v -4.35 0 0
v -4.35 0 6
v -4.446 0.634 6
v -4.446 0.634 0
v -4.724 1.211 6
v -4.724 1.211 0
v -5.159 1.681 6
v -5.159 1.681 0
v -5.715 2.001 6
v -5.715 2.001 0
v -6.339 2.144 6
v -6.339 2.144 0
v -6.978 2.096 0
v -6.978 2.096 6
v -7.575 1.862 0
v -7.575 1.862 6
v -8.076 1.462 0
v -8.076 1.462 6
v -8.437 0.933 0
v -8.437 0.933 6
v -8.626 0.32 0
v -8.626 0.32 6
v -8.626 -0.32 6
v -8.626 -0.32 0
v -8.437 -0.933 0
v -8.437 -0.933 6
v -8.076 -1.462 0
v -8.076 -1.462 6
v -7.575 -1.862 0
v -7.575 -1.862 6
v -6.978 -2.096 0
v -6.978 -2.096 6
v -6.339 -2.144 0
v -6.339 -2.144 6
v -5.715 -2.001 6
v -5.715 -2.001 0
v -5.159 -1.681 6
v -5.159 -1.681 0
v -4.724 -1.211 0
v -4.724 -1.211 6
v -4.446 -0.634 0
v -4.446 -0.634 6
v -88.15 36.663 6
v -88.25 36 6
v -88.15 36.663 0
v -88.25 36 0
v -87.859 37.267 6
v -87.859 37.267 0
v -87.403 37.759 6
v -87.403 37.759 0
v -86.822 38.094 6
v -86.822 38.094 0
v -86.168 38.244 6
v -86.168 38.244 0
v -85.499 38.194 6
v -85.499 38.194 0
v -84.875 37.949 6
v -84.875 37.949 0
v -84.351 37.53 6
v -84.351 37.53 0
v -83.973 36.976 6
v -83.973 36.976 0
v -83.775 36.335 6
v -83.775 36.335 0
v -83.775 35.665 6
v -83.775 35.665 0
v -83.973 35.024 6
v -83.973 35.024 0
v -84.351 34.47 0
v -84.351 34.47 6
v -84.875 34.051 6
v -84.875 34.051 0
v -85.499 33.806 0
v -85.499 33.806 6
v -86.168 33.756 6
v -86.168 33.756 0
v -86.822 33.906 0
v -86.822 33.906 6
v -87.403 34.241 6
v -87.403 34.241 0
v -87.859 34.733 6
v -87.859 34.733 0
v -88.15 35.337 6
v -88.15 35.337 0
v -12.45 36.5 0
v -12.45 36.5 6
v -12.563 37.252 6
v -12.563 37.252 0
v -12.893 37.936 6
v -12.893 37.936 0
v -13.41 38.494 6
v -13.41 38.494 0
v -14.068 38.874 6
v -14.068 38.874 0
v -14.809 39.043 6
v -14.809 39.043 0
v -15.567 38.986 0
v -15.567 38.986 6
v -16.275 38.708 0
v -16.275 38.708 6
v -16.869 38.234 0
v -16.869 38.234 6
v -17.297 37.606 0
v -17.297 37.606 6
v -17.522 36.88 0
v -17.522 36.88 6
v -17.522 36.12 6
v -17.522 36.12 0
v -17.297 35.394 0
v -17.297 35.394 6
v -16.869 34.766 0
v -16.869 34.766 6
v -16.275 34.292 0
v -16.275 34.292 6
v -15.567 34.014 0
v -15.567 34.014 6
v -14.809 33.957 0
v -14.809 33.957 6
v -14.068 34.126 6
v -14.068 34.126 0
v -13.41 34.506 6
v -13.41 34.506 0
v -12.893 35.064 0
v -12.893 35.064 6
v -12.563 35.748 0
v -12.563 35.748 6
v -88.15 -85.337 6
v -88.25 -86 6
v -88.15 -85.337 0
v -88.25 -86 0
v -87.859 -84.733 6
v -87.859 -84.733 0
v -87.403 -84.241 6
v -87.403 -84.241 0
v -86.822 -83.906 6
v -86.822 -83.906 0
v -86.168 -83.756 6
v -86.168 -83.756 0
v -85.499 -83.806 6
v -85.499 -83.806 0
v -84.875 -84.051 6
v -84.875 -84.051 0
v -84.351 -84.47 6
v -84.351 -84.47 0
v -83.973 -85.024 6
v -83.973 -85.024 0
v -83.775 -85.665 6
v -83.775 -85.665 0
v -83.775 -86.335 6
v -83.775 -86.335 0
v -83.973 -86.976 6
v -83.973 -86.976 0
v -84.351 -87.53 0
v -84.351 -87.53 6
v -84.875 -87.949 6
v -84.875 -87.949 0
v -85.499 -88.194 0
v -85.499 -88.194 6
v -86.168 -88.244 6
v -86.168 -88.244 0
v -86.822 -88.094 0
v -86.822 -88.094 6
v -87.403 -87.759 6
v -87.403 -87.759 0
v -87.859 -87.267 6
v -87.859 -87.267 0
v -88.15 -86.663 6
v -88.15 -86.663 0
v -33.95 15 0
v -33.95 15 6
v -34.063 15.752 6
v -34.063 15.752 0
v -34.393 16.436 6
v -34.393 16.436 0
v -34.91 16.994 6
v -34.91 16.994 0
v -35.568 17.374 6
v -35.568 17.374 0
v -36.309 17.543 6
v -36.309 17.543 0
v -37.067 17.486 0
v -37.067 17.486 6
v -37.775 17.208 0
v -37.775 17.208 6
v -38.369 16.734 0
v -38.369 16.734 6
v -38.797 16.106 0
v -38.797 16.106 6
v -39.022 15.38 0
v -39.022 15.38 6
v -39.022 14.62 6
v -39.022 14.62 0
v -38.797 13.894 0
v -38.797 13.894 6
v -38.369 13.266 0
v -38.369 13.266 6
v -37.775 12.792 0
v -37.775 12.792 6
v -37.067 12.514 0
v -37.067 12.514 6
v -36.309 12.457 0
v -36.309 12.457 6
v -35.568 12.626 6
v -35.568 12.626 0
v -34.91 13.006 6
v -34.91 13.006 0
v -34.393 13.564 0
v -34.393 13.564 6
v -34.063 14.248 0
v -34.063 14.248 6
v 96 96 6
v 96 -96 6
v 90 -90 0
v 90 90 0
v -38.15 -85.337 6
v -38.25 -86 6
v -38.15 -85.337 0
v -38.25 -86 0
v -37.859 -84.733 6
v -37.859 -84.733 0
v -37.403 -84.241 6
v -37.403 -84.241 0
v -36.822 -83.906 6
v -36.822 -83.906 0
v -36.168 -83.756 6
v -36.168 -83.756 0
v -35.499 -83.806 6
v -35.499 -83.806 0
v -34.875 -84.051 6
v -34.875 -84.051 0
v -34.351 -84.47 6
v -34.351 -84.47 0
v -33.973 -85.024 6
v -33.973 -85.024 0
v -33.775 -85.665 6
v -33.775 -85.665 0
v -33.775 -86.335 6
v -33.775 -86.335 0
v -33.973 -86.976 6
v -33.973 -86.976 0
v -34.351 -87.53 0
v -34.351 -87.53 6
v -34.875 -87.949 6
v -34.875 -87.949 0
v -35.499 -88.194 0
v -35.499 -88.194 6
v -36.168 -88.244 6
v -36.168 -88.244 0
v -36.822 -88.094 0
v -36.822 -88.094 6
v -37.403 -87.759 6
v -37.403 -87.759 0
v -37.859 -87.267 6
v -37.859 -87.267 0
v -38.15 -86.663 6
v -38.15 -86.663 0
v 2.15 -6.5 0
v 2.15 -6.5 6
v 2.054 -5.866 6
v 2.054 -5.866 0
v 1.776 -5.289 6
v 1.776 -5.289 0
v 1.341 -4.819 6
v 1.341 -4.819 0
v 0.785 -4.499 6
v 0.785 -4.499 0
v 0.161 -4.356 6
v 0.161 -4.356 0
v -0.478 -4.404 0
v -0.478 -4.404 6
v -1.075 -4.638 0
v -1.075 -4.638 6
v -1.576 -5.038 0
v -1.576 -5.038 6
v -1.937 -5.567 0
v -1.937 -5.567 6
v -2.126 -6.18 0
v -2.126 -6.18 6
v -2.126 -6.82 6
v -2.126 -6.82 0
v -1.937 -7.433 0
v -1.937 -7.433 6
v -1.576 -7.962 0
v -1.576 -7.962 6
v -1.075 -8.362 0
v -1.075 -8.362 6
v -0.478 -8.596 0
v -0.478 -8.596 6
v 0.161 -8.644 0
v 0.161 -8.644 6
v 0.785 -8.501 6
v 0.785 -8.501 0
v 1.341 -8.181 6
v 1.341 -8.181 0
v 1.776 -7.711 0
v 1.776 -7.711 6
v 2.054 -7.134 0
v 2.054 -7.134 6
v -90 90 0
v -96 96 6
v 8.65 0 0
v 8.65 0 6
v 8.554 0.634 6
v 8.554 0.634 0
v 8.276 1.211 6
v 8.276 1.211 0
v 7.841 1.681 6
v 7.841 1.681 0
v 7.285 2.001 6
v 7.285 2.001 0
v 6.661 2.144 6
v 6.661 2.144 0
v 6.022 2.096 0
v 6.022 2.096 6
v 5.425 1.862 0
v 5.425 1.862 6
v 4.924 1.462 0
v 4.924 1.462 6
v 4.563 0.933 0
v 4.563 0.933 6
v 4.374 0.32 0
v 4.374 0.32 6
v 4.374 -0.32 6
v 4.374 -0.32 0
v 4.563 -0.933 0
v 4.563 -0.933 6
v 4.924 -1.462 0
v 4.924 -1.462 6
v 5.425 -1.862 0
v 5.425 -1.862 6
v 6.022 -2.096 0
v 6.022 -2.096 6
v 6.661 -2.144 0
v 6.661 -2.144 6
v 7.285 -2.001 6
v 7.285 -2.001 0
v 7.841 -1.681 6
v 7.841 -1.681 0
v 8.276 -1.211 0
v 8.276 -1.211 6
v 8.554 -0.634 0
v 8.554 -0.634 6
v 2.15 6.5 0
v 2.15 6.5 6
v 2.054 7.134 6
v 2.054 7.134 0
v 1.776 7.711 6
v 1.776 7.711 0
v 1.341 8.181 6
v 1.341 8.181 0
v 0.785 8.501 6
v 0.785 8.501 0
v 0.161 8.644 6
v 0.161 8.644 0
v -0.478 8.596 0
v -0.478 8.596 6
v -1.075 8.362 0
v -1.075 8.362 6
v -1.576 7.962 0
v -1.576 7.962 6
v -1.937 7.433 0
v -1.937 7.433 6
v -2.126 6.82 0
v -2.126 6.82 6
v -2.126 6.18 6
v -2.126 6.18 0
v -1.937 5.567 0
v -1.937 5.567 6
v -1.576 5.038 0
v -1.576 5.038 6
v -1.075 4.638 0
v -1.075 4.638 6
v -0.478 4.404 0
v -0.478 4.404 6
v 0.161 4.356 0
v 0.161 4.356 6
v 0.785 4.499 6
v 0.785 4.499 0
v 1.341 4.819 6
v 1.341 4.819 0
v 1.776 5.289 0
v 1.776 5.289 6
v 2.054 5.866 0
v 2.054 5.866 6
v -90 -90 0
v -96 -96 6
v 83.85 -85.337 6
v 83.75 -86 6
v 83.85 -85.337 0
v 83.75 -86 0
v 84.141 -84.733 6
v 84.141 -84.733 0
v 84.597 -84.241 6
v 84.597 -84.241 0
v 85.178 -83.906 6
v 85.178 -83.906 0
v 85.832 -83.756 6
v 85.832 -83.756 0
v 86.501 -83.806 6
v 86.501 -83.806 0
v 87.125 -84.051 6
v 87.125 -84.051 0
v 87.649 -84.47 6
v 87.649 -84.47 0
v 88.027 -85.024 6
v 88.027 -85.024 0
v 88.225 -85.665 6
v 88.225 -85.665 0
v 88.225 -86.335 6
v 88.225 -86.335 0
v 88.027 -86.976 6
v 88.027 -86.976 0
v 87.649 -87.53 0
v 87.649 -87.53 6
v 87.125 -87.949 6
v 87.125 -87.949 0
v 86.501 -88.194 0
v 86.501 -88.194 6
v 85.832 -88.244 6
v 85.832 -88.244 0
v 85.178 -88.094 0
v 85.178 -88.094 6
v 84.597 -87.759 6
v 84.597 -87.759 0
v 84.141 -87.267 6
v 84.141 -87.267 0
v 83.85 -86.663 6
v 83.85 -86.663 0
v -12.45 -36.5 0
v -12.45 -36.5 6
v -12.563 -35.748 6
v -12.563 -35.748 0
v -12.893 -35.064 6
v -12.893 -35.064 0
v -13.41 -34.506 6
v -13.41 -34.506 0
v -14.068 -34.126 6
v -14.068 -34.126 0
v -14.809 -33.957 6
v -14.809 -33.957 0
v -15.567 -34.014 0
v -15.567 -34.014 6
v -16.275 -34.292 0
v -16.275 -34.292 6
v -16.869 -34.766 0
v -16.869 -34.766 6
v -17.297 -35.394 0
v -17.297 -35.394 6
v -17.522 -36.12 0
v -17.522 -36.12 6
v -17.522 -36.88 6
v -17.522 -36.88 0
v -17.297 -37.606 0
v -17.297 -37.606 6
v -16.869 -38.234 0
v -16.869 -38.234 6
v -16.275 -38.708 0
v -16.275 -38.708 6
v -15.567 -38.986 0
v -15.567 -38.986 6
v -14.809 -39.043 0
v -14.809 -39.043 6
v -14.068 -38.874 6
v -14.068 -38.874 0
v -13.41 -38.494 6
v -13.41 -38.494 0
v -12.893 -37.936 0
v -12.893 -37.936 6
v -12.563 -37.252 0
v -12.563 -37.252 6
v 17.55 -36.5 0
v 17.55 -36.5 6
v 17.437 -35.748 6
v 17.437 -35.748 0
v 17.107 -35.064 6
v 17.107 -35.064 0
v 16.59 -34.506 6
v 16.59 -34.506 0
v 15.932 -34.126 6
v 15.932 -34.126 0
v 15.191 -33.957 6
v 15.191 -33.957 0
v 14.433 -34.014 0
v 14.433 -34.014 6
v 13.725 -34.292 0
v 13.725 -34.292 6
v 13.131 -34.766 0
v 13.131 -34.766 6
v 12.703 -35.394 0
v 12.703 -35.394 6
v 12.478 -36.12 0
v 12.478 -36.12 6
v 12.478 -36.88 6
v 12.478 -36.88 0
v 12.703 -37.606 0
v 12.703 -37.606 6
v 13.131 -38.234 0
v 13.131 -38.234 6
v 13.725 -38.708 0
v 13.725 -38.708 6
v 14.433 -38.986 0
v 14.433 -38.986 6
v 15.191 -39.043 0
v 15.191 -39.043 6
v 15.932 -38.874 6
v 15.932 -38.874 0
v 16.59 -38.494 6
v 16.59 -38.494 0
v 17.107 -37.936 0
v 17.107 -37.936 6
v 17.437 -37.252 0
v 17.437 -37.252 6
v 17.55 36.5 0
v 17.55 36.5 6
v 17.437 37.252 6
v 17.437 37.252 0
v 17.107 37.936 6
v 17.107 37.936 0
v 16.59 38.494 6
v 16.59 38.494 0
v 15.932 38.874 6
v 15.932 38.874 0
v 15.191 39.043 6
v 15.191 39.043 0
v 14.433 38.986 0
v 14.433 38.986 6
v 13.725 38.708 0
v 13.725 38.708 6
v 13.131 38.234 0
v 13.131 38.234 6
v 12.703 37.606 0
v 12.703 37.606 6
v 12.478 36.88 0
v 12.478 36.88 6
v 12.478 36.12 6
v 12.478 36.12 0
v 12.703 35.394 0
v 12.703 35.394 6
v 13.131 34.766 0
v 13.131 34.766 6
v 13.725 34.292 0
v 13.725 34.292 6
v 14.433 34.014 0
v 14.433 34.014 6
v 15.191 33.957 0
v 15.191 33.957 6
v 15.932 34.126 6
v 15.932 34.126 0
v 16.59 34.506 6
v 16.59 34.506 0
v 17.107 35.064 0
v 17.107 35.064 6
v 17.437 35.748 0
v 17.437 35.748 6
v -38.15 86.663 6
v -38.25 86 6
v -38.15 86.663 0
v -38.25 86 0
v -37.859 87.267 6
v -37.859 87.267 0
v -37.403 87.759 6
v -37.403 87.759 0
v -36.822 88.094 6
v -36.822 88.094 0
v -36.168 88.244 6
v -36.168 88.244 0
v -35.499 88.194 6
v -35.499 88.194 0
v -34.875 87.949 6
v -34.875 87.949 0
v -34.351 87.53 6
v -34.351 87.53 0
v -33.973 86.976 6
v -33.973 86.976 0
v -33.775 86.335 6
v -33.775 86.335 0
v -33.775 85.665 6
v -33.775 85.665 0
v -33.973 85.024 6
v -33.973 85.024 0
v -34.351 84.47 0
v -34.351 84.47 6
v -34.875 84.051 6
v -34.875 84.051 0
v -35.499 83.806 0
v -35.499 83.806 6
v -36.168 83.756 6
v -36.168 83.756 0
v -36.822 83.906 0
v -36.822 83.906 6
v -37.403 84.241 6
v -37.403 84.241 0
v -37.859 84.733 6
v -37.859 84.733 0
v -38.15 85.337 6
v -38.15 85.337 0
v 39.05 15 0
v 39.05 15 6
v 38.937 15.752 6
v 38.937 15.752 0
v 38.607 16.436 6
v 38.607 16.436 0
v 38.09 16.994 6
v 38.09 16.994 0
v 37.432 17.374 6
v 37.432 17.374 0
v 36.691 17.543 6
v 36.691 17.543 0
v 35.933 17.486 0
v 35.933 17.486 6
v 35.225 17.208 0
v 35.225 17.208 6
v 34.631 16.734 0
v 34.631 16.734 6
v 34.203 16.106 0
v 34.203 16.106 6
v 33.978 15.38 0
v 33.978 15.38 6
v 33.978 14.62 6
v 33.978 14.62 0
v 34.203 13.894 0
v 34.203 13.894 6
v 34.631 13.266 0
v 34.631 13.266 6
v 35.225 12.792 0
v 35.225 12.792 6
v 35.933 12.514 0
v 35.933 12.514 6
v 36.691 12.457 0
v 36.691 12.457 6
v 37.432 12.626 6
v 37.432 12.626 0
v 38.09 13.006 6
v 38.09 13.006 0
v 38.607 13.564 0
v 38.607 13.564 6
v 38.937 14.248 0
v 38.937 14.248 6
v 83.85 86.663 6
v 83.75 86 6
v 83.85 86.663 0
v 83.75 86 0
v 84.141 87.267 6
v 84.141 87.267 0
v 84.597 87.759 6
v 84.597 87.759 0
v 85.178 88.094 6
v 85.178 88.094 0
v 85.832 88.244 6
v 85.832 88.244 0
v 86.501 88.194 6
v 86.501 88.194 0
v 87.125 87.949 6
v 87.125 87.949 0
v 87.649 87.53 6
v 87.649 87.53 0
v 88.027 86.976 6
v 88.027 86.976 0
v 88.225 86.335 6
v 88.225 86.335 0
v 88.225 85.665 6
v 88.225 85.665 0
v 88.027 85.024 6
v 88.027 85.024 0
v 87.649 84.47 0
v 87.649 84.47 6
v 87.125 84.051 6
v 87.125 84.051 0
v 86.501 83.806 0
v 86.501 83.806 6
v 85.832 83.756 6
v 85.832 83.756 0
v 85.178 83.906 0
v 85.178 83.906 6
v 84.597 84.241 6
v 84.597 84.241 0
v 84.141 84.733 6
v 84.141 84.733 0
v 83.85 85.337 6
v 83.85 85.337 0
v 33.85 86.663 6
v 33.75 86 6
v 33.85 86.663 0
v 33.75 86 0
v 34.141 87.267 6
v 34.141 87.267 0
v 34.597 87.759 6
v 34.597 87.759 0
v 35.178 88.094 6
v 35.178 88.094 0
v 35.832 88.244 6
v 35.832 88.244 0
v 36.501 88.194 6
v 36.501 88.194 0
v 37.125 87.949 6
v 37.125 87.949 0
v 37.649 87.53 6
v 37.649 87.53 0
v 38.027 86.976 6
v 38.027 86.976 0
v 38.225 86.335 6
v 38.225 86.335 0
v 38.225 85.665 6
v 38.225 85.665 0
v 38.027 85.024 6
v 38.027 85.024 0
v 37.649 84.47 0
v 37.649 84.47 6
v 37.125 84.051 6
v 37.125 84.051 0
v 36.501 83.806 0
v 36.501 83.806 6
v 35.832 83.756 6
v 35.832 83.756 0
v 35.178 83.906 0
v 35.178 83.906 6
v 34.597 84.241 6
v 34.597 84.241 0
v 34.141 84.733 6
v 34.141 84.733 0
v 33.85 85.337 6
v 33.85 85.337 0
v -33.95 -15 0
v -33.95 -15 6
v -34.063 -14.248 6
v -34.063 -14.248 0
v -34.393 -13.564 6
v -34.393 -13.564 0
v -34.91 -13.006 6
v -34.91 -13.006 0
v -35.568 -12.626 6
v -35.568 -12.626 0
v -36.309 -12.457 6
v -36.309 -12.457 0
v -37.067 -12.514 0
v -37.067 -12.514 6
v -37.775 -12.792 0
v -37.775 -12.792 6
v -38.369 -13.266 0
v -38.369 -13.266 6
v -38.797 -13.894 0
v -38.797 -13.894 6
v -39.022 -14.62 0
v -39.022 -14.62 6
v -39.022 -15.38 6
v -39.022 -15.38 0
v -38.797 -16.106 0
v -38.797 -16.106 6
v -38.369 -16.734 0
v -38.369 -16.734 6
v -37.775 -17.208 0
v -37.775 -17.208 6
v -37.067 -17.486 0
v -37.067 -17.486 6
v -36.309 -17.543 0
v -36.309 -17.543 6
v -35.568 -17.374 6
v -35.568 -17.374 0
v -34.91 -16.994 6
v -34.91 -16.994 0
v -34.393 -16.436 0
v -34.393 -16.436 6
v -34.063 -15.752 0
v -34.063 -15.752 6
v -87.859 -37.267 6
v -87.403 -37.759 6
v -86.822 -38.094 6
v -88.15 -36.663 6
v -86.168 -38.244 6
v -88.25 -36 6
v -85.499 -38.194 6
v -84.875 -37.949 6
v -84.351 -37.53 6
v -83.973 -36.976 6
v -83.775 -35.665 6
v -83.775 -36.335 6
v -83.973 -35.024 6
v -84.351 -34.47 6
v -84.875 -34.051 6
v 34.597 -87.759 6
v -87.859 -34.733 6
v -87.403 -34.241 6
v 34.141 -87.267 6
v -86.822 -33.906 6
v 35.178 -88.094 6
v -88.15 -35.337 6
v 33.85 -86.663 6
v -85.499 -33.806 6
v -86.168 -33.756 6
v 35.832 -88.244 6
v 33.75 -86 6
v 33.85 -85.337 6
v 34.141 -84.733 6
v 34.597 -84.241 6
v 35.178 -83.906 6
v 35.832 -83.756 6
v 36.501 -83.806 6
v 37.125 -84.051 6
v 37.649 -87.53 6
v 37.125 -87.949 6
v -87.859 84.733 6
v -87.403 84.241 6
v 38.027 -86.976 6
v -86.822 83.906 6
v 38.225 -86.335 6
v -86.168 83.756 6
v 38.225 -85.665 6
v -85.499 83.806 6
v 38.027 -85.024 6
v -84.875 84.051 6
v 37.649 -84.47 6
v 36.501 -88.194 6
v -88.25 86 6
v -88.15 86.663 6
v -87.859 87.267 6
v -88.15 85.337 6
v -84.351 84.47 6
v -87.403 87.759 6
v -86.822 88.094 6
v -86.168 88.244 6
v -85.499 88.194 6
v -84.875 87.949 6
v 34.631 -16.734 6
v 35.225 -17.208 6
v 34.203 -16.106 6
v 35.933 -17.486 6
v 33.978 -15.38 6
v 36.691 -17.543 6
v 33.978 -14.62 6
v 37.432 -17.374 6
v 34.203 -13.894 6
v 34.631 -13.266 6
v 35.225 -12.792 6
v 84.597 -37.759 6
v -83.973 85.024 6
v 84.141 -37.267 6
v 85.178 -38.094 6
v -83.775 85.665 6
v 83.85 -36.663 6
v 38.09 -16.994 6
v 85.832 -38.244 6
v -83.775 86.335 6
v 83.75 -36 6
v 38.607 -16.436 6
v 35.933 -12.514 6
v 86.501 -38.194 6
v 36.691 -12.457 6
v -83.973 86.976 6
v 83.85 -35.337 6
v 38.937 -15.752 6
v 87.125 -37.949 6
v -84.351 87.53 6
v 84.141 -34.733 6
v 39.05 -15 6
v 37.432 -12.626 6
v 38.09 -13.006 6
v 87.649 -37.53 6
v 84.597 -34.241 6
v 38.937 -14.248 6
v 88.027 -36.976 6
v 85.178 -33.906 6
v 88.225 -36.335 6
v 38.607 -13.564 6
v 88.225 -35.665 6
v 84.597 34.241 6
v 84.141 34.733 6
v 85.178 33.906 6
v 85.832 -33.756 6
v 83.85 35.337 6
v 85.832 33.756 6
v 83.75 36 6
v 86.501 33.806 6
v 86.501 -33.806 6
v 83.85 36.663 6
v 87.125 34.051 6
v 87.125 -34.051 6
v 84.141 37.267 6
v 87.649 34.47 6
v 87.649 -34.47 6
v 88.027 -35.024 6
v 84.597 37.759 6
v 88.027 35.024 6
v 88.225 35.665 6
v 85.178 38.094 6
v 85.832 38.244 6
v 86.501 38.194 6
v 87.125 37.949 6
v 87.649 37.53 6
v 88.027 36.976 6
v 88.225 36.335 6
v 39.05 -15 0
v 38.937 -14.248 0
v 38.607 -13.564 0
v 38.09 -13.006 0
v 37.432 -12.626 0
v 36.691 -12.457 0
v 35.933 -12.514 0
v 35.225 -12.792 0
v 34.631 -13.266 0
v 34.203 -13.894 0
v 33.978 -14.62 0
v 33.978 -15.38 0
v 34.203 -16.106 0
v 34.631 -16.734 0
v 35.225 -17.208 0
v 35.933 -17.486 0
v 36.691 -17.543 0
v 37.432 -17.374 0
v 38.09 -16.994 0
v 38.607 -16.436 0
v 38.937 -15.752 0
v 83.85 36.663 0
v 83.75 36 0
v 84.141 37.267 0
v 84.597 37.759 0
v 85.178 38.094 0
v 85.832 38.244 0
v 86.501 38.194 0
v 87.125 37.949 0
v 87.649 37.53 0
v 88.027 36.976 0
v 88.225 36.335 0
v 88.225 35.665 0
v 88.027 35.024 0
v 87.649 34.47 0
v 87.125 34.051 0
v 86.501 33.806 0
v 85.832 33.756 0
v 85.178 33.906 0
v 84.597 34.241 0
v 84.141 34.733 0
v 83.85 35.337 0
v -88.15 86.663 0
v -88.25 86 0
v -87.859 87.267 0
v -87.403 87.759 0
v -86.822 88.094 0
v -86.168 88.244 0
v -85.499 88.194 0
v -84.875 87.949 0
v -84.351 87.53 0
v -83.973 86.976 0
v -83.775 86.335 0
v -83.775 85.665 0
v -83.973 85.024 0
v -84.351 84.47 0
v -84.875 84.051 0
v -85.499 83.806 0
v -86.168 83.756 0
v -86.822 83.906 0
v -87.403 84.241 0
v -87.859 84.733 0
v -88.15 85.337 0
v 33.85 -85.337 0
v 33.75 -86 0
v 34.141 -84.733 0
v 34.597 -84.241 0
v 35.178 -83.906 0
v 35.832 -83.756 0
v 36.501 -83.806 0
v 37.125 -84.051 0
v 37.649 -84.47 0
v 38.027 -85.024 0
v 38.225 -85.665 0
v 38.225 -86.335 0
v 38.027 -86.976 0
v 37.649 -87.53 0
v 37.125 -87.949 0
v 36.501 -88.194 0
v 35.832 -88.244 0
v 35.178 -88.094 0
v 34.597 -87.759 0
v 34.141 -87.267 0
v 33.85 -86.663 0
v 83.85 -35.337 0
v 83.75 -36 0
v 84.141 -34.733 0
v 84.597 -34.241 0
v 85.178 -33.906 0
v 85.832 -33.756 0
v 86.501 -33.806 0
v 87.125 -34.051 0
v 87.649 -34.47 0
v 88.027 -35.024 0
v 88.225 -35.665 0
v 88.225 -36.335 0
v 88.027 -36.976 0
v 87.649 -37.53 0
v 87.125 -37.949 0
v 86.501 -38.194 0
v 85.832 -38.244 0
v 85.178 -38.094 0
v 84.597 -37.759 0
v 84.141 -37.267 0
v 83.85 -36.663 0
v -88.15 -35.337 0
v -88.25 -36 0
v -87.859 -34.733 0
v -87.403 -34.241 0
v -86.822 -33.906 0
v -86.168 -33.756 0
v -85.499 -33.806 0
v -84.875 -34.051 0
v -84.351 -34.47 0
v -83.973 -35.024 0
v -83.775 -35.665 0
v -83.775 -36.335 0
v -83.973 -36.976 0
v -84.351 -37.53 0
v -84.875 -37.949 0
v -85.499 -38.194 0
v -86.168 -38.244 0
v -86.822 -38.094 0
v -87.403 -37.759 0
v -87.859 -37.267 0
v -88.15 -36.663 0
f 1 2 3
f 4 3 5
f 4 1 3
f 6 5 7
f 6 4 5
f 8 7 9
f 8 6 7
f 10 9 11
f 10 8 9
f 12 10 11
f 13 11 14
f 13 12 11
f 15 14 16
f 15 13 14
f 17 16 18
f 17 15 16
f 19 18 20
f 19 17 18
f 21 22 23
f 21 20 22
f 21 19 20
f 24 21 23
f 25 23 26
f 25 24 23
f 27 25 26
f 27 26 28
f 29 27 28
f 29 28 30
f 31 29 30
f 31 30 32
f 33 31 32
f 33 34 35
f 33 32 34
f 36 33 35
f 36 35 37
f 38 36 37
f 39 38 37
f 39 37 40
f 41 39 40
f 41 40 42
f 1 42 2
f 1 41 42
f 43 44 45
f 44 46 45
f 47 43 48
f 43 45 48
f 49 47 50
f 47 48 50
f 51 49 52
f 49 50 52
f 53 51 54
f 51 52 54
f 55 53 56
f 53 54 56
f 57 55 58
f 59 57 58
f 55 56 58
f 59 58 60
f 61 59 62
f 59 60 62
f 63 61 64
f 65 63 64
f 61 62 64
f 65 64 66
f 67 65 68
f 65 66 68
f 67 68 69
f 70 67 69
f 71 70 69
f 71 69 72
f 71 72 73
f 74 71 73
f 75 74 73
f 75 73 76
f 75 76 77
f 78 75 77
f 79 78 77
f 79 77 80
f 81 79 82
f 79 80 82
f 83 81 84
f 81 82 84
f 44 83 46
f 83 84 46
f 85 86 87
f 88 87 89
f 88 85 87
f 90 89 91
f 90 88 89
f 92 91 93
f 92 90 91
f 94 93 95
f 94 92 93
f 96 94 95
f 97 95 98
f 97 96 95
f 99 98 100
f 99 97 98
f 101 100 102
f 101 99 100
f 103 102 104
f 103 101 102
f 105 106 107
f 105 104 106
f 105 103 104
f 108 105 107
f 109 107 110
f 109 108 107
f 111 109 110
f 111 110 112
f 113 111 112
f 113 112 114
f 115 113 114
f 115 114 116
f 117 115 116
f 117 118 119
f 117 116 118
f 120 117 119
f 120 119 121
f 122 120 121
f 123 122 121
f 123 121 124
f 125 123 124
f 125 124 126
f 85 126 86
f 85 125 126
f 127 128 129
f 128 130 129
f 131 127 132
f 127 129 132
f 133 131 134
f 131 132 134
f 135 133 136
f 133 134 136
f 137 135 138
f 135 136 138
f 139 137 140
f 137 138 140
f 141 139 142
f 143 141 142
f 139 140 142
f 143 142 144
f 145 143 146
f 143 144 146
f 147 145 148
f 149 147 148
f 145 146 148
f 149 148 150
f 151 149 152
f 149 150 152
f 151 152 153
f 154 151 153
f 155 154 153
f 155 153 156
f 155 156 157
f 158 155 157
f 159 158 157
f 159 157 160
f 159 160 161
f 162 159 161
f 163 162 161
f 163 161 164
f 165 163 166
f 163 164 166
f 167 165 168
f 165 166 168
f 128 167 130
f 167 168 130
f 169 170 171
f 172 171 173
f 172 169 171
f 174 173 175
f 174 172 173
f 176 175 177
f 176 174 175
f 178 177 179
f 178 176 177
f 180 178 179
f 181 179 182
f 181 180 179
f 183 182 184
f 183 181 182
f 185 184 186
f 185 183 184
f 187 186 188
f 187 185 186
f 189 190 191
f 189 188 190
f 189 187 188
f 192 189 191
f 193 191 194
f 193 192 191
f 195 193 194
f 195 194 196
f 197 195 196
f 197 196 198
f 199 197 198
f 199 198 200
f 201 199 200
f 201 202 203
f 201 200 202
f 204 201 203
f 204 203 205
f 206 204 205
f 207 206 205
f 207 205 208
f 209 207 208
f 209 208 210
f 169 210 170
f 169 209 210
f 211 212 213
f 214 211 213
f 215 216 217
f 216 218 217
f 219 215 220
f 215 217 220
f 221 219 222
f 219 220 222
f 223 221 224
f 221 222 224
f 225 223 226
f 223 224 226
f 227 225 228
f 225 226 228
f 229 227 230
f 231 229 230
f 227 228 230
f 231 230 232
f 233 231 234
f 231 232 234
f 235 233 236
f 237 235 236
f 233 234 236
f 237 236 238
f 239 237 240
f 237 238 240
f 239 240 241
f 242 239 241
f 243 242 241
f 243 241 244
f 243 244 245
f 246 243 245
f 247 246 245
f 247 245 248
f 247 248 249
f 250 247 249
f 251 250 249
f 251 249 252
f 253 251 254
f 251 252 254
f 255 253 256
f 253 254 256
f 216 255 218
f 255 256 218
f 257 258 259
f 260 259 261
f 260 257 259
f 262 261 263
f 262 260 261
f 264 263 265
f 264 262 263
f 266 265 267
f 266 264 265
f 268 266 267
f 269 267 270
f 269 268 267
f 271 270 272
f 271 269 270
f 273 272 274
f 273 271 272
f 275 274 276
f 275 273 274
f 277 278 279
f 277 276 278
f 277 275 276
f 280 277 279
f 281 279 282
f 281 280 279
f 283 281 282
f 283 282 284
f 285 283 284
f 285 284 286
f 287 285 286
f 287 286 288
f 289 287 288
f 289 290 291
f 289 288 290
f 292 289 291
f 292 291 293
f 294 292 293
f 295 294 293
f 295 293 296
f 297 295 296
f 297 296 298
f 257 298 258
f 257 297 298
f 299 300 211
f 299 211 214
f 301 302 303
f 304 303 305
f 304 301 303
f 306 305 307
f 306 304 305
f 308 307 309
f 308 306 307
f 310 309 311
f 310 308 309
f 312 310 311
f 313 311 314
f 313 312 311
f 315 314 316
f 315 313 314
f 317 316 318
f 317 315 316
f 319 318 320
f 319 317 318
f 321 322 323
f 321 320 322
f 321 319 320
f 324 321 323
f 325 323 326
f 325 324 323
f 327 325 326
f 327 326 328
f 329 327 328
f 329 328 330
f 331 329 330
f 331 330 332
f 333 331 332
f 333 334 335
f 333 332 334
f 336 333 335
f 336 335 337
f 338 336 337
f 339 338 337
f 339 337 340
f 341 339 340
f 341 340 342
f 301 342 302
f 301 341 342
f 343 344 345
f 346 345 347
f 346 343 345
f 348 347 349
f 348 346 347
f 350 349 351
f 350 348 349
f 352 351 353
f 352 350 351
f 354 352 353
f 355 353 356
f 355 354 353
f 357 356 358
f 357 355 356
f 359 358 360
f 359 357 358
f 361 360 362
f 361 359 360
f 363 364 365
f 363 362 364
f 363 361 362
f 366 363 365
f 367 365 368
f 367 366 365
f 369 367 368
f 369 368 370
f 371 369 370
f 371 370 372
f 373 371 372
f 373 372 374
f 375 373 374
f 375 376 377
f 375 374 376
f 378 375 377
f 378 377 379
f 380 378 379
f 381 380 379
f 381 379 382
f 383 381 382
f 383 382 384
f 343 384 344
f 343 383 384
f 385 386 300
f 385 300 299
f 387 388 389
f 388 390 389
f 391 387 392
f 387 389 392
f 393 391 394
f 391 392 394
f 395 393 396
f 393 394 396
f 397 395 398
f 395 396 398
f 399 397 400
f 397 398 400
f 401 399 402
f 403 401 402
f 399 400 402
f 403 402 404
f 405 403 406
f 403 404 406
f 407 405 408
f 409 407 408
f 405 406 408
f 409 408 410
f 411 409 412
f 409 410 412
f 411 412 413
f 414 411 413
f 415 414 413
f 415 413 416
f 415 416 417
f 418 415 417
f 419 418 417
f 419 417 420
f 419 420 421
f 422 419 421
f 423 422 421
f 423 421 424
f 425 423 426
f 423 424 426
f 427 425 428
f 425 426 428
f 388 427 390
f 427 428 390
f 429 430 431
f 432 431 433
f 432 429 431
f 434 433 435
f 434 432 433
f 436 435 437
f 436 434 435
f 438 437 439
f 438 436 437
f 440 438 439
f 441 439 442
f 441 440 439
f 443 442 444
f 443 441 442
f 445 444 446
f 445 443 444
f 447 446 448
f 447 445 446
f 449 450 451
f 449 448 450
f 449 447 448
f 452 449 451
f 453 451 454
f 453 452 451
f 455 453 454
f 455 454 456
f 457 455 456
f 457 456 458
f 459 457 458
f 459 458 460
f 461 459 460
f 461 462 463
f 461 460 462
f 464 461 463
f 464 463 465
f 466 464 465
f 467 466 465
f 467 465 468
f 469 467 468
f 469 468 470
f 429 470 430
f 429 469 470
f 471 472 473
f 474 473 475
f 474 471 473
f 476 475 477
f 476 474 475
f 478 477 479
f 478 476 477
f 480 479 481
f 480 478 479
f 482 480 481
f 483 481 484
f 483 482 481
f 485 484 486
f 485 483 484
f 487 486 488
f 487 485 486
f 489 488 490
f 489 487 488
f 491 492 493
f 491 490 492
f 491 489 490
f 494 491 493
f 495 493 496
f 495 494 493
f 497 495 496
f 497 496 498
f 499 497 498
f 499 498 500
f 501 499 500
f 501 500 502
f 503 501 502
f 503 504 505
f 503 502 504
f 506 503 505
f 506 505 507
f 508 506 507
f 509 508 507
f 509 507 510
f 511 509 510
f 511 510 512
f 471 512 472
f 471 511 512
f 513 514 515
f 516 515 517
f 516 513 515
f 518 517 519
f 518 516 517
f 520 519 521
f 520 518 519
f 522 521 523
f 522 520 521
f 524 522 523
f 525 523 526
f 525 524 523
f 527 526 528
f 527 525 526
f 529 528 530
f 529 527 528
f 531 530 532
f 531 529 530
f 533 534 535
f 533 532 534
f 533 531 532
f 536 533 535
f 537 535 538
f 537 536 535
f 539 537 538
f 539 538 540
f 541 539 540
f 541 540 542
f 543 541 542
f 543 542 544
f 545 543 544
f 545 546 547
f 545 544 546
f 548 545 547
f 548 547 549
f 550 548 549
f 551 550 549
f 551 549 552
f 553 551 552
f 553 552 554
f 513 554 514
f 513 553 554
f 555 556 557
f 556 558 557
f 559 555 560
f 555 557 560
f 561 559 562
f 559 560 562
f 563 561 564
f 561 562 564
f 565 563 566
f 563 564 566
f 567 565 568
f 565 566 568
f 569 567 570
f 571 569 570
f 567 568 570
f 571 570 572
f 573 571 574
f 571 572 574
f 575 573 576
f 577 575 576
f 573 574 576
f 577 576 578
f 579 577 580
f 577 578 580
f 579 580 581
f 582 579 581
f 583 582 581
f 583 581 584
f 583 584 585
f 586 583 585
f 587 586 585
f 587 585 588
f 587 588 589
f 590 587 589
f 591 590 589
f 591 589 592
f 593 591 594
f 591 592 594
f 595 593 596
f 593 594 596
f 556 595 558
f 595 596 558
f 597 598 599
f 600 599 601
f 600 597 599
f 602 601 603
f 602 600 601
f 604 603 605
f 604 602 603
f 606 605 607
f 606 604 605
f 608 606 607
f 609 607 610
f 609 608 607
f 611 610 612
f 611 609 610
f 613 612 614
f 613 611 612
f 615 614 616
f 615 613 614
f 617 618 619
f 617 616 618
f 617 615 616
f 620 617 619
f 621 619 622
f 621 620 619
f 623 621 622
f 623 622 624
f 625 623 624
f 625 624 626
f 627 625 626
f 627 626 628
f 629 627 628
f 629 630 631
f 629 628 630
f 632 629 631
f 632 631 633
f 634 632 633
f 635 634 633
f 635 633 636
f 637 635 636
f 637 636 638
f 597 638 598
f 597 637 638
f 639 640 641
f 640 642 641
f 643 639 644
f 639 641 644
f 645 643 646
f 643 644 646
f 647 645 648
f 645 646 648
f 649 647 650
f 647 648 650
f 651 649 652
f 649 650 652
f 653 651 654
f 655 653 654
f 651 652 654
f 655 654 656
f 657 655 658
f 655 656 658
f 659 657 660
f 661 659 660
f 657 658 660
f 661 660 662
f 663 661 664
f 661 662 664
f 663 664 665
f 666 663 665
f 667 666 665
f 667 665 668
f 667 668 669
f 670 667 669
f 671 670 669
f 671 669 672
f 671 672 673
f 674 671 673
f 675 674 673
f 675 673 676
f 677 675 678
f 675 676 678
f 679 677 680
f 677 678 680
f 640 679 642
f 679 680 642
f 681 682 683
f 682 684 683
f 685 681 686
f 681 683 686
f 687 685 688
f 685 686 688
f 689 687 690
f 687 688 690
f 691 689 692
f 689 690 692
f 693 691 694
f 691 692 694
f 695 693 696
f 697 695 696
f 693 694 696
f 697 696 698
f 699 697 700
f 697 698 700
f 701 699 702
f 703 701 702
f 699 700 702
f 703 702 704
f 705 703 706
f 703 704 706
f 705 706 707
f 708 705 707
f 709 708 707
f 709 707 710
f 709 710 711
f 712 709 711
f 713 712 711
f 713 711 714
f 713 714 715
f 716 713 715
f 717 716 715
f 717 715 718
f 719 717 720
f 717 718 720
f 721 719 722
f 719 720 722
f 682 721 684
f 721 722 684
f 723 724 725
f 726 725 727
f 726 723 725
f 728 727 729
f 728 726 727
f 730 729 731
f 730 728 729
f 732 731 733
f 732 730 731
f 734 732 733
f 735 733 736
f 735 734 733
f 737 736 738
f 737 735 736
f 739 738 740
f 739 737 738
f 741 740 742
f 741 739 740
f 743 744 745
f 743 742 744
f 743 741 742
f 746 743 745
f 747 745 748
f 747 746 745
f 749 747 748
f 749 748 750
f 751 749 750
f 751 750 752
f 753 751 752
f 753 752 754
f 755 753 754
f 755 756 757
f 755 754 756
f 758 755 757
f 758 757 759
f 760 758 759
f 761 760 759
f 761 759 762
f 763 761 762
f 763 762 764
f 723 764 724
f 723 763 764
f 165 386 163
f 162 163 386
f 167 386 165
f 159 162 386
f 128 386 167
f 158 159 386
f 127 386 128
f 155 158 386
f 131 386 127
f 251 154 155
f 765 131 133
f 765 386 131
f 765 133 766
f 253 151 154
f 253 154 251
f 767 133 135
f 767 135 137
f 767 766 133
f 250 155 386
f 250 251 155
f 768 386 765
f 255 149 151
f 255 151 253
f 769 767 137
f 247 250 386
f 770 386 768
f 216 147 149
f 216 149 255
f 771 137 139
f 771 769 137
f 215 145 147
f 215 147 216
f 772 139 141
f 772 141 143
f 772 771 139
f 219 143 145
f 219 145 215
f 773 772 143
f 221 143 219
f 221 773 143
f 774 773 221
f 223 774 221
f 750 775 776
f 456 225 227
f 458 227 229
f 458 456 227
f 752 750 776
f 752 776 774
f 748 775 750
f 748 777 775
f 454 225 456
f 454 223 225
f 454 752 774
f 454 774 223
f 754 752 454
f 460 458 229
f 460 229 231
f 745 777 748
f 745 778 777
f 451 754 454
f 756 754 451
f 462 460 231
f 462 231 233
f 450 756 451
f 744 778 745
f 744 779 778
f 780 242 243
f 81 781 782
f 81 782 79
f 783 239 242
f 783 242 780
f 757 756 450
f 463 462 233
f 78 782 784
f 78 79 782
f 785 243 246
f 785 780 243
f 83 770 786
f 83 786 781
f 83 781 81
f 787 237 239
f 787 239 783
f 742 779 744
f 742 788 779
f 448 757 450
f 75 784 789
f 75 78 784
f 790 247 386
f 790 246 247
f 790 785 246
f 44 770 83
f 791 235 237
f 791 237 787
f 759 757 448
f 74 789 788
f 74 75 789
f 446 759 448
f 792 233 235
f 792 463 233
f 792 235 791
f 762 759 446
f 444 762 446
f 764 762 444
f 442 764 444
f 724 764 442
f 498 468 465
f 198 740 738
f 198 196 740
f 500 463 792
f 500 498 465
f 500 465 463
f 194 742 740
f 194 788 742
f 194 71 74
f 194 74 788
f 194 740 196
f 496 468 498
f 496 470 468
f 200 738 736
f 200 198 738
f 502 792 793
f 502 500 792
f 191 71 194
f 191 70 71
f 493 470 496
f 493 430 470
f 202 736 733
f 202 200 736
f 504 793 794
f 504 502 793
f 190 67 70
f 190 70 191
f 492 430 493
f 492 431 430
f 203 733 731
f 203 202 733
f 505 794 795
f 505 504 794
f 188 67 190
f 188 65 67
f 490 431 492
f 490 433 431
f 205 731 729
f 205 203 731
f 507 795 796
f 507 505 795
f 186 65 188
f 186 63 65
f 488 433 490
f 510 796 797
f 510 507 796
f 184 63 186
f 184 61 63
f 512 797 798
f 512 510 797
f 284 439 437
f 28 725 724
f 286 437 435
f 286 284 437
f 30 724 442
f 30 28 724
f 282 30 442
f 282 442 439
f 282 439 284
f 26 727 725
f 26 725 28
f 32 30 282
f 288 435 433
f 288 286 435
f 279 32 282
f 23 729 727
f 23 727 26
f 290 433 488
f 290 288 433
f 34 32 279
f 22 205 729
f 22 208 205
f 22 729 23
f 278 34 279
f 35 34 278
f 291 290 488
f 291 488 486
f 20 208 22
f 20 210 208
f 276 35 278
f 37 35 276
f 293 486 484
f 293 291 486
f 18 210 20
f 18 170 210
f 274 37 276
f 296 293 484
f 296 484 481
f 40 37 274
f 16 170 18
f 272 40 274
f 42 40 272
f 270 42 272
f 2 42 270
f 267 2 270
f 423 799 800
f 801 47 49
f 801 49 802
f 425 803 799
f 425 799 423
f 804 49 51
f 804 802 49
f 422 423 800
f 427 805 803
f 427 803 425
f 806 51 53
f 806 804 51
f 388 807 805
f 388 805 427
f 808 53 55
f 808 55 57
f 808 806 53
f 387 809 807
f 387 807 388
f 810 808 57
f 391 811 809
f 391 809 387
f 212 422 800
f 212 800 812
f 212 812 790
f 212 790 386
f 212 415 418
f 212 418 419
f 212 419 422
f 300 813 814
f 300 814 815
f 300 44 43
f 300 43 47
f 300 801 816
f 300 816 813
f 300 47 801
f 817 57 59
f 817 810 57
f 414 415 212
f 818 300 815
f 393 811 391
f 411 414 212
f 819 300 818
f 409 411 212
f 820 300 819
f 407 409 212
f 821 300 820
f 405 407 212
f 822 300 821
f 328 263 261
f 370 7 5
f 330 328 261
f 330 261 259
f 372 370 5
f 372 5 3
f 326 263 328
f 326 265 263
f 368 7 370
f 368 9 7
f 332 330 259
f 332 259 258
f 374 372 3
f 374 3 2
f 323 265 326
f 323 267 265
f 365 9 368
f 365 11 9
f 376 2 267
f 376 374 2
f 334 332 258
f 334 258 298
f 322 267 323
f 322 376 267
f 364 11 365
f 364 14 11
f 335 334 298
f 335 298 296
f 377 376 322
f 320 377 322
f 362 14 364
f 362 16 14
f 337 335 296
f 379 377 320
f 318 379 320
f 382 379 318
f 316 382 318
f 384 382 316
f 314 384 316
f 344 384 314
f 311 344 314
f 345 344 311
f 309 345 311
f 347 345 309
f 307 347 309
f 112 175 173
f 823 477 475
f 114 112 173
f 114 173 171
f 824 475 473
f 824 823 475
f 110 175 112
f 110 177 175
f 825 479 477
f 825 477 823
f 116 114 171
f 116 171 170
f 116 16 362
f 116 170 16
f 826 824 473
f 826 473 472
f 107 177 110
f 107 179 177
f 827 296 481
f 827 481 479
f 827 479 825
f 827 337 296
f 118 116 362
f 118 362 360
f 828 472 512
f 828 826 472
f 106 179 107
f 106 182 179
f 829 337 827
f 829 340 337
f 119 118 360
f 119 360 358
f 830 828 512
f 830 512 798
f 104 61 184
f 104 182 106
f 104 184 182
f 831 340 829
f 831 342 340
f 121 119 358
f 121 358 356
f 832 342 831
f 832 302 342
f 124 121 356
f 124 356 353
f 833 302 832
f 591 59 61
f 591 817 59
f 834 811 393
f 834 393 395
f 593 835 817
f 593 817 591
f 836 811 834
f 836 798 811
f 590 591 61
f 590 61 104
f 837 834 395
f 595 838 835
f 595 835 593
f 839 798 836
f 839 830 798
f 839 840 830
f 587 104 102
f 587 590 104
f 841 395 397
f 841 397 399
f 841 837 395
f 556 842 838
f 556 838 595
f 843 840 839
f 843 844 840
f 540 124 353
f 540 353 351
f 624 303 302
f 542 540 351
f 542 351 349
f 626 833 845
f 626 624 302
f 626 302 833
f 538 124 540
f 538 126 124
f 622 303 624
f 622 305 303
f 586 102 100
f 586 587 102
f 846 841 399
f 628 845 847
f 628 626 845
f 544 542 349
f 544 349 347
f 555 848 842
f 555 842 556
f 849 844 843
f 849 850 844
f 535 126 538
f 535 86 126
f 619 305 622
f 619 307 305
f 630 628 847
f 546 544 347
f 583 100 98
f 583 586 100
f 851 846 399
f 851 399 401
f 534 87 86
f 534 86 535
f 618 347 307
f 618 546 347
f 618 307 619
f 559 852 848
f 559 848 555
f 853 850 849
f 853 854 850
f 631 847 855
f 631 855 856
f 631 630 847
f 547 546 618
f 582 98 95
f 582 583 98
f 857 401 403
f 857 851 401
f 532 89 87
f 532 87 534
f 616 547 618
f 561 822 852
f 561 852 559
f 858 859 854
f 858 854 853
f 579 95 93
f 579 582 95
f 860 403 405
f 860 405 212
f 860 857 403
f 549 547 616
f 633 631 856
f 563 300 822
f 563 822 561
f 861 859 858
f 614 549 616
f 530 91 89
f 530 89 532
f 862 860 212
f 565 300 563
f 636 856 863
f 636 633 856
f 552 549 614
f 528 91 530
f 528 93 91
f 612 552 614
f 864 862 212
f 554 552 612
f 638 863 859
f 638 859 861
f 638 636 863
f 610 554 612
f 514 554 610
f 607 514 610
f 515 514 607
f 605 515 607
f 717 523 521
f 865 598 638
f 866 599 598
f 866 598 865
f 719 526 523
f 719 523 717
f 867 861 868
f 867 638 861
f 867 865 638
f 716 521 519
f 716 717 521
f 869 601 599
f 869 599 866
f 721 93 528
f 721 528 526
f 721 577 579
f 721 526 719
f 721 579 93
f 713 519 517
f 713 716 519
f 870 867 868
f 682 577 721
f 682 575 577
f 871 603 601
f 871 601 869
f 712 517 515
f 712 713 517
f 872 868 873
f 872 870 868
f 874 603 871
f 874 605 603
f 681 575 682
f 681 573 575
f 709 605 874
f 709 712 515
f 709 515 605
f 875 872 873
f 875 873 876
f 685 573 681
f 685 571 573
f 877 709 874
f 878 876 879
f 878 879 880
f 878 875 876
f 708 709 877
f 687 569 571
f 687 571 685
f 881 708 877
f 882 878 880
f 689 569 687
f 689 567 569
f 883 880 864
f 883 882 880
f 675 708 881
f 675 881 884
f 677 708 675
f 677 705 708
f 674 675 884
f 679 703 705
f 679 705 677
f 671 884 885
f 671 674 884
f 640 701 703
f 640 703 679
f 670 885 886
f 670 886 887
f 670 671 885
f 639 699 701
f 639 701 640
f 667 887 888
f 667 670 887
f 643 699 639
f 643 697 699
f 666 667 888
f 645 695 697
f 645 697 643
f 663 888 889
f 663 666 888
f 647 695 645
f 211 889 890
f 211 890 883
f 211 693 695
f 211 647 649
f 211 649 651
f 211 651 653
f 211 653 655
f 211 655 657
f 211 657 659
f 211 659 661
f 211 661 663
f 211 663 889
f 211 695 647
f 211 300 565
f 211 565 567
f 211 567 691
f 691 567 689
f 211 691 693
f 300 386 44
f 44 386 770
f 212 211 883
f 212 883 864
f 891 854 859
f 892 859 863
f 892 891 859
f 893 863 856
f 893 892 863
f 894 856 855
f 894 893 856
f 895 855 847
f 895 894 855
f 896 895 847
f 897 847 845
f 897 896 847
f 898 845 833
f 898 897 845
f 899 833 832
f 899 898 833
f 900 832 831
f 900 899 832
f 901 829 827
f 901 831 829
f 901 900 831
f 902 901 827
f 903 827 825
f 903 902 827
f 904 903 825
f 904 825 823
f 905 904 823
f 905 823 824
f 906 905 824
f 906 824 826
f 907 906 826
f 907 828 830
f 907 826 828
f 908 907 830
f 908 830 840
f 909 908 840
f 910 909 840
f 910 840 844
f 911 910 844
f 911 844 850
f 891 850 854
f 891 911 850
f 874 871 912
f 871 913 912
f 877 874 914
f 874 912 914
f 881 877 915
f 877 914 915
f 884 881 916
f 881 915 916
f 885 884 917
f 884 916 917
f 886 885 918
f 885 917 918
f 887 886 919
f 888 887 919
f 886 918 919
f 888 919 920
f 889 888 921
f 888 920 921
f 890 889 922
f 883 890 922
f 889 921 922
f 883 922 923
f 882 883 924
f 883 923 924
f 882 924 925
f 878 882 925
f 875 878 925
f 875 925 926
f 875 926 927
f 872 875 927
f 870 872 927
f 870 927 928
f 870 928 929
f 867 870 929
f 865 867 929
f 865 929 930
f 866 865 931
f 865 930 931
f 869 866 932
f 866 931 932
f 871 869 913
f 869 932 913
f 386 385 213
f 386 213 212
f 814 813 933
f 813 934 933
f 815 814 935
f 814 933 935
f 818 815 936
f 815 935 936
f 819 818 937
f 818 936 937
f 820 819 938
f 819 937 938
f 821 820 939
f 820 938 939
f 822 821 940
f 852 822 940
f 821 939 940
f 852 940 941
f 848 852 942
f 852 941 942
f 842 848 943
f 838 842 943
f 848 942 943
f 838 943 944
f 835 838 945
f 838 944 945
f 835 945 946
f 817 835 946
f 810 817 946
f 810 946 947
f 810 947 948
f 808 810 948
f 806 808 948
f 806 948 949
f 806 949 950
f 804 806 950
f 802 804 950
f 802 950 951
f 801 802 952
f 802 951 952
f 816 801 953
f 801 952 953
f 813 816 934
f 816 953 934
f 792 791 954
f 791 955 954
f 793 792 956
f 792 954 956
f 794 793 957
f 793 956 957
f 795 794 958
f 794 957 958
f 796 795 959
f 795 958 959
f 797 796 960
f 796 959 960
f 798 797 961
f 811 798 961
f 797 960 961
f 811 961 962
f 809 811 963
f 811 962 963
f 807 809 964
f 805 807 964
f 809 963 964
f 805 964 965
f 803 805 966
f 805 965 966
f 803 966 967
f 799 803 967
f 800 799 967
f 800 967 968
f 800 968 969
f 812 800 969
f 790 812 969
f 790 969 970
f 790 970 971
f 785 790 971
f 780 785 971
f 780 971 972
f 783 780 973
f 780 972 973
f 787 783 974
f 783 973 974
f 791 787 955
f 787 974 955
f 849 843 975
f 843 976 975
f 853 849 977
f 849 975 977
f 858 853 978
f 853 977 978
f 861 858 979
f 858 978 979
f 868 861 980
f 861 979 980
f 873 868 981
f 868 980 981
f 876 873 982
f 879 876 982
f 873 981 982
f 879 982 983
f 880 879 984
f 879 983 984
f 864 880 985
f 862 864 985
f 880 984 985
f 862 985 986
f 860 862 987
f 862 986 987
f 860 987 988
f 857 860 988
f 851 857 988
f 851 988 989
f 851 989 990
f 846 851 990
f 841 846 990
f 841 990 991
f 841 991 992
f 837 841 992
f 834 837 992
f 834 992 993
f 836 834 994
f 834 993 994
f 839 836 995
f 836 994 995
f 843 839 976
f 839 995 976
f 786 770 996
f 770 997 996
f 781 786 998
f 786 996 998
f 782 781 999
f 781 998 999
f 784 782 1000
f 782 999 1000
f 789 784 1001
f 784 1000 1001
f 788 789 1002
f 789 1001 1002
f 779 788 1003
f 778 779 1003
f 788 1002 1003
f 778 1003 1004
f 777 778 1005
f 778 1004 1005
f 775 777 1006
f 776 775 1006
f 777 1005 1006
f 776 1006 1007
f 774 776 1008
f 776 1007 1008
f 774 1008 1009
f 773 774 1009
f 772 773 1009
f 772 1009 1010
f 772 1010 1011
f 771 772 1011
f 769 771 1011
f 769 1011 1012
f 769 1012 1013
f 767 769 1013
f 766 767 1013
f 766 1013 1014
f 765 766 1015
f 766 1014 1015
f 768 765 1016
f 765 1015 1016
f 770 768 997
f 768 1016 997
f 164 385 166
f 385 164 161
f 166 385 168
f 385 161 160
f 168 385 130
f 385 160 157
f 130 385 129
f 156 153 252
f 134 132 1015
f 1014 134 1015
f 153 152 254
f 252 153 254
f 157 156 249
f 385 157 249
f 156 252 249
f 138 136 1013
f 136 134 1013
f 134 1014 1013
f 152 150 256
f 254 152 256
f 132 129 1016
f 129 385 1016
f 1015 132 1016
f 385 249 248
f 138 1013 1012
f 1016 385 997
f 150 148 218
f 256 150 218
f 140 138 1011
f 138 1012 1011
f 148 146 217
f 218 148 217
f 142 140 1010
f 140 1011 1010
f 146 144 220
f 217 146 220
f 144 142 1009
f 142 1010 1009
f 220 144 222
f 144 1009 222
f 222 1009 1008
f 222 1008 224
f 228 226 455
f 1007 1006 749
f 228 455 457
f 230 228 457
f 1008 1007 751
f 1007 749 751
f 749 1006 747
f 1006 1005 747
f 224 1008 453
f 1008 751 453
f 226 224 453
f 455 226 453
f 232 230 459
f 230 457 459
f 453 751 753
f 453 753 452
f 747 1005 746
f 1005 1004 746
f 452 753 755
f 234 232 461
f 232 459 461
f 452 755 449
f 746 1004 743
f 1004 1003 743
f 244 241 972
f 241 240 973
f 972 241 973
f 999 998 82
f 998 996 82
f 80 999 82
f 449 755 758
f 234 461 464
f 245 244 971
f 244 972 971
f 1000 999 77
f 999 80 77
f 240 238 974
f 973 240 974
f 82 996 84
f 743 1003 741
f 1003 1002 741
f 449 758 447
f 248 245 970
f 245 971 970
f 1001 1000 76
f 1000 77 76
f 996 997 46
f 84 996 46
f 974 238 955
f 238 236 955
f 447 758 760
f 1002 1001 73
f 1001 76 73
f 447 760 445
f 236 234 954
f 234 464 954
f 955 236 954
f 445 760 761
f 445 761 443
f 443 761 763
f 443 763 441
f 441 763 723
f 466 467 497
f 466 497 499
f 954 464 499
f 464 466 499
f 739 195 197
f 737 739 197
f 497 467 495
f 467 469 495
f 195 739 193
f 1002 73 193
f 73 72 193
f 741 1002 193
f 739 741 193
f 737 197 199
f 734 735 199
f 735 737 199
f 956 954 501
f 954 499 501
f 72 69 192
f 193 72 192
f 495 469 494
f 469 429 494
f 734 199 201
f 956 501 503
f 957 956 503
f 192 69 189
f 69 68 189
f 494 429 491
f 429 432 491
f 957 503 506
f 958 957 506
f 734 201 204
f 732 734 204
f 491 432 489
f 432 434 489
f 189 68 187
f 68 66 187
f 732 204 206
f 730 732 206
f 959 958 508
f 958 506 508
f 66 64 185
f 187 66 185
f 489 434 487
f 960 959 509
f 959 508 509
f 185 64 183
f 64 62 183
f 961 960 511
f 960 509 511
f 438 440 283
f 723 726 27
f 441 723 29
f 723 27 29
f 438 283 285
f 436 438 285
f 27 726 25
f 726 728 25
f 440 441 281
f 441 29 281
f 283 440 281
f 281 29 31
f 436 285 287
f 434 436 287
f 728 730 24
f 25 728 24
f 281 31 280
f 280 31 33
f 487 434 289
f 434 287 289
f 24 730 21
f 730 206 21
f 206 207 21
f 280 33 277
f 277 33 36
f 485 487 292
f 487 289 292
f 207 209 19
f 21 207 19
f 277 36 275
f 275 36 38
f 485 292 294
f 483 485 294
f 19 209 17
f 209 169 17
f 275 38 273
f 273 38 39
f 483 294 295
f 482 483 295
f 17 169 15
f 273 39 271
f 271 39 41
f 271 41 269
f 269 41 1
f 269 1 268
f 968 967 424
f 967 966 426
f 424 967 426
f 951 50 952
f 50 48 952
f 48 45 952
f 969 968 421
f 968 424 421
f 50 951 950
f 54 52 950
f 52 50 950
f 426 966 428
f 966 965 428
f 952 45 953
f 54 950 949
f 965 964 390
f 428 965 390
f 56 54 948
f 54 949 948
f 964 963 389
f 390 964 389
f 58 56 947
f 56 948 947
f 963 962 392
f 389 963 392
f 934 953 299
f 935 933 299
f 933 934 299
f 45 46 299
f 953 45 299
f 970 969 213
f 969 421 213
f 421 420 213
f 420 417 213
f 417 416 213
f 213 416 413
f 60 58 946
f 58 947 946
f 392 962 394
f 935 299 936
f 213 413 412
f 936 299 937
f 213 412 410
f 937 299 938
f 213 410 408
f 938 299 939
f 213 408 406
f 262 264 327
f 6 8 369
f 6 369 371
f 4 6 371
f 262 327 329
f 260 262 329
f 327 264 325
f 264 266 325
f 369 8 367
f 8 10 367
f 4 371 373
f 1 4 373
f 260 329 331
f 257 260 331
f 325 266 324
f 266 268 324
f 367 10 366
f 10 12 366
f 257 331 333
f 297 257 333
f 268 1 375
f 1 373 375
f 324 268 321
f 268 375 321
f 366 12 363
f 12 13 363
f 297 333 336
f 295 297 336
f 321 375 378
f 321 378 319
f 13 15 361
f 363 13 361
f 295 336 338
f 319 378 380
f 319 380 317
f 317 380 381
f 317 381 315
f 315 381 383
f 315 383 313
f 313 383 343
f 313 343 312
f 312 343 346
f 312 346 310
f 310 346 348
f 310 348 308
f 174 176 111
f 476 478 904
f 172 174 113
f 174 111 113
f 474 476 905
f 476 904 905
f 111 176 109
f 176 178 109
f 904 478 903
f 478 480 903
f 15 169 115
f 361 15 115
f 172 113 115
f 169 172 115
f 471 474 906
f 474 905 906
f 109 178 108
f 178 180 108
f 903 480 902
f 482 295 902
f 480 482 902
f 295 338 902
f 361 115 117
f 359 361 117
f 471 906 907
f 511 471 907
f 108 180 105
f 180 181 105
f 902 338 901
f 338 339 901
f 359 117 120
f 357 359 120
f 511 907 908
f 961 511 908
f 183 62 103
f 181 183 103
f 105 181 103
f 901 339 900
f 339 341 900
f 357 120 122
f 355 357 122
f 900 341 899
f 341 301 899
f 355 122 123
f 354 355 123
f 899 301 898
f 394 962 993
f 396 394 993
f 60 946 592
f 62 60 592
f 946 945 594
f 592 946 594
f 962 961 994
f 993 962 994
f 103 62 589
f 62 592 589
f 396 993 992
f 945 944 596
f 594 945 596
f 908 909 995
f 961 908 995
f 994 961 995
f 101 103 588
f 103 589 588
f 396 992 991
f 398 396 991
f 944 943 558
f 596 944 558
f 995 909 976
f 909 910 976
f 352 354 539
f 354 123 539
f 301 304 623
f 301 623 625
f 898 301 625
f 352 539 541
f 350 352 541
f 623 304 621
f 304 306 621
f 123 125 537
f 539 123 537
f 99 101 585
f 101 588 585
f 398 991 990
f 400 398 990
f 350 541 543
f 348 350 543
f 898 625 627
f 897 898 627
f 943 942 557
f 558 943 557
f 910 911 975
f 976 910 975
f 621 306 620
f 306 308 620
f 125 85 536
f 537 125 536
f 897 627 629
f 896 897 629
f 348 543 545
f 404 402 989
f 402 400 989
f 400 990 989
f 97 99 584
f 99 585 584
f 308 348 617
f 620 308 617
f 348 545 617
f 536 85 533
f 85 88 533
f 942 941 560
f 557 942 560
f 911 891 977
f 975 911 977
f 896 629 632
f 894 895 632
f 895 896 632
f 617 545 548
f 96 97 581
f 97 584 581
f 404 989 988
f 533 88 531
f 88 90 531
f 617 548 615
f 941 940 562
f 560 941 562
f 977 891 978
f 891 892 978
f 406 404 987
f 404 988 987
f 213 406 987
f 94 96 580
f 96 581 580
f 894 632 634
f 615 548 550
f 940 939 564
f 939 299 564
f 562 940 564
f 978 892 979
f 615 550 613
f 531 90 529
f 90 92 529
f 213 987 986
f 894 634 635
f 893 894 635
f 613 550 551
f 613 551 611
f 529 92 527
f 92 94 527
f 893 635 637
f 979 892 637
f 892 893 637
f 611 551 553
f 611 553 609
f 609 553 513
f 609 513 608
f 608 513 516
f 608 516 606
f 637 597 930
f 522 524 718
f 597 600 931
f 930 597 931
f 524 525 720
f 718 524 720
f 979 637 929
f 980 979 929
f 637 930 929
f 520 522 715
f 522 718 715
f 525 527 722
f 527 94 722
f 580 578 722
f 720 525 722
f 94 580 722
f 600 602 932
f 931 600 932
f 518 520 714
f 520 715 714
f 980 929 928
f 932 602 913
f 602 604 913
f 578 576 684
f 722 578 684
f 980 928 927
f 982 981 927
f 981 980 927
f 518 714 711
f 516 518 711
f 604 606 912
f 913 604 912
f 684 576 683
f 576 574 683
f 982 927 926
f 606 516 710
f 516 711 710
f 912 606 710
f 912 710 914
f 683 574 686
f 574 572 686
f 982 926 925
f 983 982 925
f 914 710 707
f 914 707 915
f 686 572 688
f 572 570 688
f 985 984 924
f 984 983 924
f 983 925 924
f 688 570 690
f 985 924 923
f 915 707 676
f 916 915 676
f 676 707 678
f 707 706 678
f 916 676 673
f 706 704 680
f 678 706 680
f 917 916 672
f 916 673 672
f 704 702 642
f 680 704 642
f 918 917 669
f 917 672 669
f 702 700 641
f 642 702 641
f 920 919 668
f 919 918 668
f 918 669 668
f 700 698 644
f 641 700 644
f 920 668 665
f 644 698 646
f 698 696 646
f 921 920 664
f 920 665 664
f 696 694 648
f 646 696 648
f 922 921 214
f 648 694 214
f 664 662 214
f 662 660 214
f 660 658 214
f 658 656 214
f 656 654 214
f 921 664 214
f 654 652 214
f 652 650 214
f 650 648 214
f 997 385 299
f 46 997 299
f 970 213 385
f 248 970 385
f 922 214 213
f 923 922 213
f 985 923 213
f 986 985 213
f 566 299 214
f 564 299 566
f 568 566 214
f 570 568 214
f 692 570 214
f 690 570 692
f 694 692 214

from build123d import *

# Parameters (mm, degrees)
SKETCH_1_W             = 200
SKETCH_1_H             = 200
EXTRUDE_1_DEPTH        = 3
SKETCH_5_W             = 200
SKETCH_5_H             = 200
EXTRUDE_2_DEPTH        = 3
SKETCH_2_R             = 2.55
SKETCH_2_R_2           = 2.15
CUT_EXTRUDE_1_DEPTH    = 10
CHAMFER_1_SIZE         = 10
HOLE_WIZARD_M4_1_D     = 4.5
HOLE_WIZARD_M4_1_DEPTH = 6
HOLE_WIZARD_M4_1_TIP   = 1.351936393


with BuildPart() as part:
    # 스케치1 → 보스-돌출1 (new body)
    with BuildSketch(Plane.XY):
        Rectangle(SKETCH_1_W, SKETCH_1_H)
    extrude(amount=EXTRUDE_1_DEPTH)

    # 스케치5 → 보스-돌출2 (add)
    with BuildSketch(Plane.XY.offset(3)):
        Rectangle(SKETCH_5_W, SKETCH_5_H)
    extrude(amount=EXTRUDE_2_DEPTH)

    # 스케치2 → 컷-돌출1 (cut)
    with BuildSketch(Plane.XY):
        with Locations((-36.5, 15)):
            Circle(SKETCH_2_R)
        with Locations((-36.5, -15)):
            Circle(SKETCH_2_R)
        with Locations((-6.5, 0)):
            Circle(SKETCH_2_R_2)
        with Locations((15, 36.5)):
            Circle(SKETCH_2_R)
        with Locations((-15, 36.5)):
            Circle(SKETCH_2_R)
        with Locations((0, 6.5)):
            Circle(SKETCH_2_R_2)
        with Locations((36.5, -15)):
            Circle(SKETCH_2_R)
        with Locations((36.5, 15)):
            Circle(SKETCH_2_R)
        with Locations((6.5, 0)):
            Circle(SKETCH_2_R_2)
        with Locations((-15, -36.5)):
            Circle(SKETCH_2_R)
        with Locations((15, -36.5)):
            Circle(SKETCH_2_R)
        with Locations((0, -6.5)):
            Circle(SKETCH_2_R_2)
    extrude(amount=CUT_EXTRUDE_1_DEPTH, mode=Mode.SUBTRACT)

    # 모따기1
    # the kernel refuses this chamfer: 10 mm, written as the material it takes off along each edge
    with BuildSketch(Plane(origin=(-125.71682988, 100, 0), x_dir=(0, 0.027495876610586317, 0.9996219169112968), z_dir=(1, 0, 0)), Plane(origin=(-100, -125.71682988, 0), x_dir=(-0.027495876610586317, 0, 0.9996219169112968), z_dir=(0, 1, 0)), Plane(origin=(100, 125.71682988, 0), x_dir=(0.027495876610586317, 0, 0.9996219169112968), z_dir=(0, -1, 0))) as chamfer_1_piece_1:
        Polygon((CHAMFER_1_SIZE * 0.999621916911, CHAMFER_1_SIZE * 0.0274958766106), (-CHAMFER_1_SIZE * 0.0274958766106, CHAMFER_1_SIZE * 0.999621916911), (0, 0), align=None)
    extrude(amount=251.433659759, mode=Mode.SUBTRACT)
    with BuildSketch(Plane(origin=(125.71682988, -100, 0), x_dir=(0, 0.9996219169112968, -0.027495876610586372), z_dir=(-1, 0, 0))) as chamfer_1_piece_2:
        Polygon((CHAMFER_1_SIZE * 0.999621916911, -CHAMFER_1_SIZE * 0.0274958766106), (-CHAMFER_1_SIZE * 0.0274958766106, -CHAMFER_1_SIZE * 0.999621916911), (0, 0), align=None)
    extrude(amount=251.433659759, mode=Mode.SUBTRACT)

    # M4 여유 구멍1
    with Locations(Plane.XY.offset(6)):
        with Locations((-86, -86), (-86, 86), (86, 86), (86, -86), (-86, -36), (-36, -86), (36, -86), (86, -36), (86, 36), (-36, 86), (36, 86), (-86, 36)):
            Hole(HOLE_WIZARD_M4_1_D / 2, depth=HOLE_WIZARD_M4_1_DEPTH)
            with Locations((0, 0, -(HOLE_WIZARD_M4_1_DEPTH + HOLE_WIZARD_M4_1_TIP / 2))):  # 118° drill point
                Cone(0, HOLE_WIZARD_M4_1_D / 2, HOLE_WIZARD_M4_1_TIP, mode=Mode.SUBTRACT)


solid = part.part
